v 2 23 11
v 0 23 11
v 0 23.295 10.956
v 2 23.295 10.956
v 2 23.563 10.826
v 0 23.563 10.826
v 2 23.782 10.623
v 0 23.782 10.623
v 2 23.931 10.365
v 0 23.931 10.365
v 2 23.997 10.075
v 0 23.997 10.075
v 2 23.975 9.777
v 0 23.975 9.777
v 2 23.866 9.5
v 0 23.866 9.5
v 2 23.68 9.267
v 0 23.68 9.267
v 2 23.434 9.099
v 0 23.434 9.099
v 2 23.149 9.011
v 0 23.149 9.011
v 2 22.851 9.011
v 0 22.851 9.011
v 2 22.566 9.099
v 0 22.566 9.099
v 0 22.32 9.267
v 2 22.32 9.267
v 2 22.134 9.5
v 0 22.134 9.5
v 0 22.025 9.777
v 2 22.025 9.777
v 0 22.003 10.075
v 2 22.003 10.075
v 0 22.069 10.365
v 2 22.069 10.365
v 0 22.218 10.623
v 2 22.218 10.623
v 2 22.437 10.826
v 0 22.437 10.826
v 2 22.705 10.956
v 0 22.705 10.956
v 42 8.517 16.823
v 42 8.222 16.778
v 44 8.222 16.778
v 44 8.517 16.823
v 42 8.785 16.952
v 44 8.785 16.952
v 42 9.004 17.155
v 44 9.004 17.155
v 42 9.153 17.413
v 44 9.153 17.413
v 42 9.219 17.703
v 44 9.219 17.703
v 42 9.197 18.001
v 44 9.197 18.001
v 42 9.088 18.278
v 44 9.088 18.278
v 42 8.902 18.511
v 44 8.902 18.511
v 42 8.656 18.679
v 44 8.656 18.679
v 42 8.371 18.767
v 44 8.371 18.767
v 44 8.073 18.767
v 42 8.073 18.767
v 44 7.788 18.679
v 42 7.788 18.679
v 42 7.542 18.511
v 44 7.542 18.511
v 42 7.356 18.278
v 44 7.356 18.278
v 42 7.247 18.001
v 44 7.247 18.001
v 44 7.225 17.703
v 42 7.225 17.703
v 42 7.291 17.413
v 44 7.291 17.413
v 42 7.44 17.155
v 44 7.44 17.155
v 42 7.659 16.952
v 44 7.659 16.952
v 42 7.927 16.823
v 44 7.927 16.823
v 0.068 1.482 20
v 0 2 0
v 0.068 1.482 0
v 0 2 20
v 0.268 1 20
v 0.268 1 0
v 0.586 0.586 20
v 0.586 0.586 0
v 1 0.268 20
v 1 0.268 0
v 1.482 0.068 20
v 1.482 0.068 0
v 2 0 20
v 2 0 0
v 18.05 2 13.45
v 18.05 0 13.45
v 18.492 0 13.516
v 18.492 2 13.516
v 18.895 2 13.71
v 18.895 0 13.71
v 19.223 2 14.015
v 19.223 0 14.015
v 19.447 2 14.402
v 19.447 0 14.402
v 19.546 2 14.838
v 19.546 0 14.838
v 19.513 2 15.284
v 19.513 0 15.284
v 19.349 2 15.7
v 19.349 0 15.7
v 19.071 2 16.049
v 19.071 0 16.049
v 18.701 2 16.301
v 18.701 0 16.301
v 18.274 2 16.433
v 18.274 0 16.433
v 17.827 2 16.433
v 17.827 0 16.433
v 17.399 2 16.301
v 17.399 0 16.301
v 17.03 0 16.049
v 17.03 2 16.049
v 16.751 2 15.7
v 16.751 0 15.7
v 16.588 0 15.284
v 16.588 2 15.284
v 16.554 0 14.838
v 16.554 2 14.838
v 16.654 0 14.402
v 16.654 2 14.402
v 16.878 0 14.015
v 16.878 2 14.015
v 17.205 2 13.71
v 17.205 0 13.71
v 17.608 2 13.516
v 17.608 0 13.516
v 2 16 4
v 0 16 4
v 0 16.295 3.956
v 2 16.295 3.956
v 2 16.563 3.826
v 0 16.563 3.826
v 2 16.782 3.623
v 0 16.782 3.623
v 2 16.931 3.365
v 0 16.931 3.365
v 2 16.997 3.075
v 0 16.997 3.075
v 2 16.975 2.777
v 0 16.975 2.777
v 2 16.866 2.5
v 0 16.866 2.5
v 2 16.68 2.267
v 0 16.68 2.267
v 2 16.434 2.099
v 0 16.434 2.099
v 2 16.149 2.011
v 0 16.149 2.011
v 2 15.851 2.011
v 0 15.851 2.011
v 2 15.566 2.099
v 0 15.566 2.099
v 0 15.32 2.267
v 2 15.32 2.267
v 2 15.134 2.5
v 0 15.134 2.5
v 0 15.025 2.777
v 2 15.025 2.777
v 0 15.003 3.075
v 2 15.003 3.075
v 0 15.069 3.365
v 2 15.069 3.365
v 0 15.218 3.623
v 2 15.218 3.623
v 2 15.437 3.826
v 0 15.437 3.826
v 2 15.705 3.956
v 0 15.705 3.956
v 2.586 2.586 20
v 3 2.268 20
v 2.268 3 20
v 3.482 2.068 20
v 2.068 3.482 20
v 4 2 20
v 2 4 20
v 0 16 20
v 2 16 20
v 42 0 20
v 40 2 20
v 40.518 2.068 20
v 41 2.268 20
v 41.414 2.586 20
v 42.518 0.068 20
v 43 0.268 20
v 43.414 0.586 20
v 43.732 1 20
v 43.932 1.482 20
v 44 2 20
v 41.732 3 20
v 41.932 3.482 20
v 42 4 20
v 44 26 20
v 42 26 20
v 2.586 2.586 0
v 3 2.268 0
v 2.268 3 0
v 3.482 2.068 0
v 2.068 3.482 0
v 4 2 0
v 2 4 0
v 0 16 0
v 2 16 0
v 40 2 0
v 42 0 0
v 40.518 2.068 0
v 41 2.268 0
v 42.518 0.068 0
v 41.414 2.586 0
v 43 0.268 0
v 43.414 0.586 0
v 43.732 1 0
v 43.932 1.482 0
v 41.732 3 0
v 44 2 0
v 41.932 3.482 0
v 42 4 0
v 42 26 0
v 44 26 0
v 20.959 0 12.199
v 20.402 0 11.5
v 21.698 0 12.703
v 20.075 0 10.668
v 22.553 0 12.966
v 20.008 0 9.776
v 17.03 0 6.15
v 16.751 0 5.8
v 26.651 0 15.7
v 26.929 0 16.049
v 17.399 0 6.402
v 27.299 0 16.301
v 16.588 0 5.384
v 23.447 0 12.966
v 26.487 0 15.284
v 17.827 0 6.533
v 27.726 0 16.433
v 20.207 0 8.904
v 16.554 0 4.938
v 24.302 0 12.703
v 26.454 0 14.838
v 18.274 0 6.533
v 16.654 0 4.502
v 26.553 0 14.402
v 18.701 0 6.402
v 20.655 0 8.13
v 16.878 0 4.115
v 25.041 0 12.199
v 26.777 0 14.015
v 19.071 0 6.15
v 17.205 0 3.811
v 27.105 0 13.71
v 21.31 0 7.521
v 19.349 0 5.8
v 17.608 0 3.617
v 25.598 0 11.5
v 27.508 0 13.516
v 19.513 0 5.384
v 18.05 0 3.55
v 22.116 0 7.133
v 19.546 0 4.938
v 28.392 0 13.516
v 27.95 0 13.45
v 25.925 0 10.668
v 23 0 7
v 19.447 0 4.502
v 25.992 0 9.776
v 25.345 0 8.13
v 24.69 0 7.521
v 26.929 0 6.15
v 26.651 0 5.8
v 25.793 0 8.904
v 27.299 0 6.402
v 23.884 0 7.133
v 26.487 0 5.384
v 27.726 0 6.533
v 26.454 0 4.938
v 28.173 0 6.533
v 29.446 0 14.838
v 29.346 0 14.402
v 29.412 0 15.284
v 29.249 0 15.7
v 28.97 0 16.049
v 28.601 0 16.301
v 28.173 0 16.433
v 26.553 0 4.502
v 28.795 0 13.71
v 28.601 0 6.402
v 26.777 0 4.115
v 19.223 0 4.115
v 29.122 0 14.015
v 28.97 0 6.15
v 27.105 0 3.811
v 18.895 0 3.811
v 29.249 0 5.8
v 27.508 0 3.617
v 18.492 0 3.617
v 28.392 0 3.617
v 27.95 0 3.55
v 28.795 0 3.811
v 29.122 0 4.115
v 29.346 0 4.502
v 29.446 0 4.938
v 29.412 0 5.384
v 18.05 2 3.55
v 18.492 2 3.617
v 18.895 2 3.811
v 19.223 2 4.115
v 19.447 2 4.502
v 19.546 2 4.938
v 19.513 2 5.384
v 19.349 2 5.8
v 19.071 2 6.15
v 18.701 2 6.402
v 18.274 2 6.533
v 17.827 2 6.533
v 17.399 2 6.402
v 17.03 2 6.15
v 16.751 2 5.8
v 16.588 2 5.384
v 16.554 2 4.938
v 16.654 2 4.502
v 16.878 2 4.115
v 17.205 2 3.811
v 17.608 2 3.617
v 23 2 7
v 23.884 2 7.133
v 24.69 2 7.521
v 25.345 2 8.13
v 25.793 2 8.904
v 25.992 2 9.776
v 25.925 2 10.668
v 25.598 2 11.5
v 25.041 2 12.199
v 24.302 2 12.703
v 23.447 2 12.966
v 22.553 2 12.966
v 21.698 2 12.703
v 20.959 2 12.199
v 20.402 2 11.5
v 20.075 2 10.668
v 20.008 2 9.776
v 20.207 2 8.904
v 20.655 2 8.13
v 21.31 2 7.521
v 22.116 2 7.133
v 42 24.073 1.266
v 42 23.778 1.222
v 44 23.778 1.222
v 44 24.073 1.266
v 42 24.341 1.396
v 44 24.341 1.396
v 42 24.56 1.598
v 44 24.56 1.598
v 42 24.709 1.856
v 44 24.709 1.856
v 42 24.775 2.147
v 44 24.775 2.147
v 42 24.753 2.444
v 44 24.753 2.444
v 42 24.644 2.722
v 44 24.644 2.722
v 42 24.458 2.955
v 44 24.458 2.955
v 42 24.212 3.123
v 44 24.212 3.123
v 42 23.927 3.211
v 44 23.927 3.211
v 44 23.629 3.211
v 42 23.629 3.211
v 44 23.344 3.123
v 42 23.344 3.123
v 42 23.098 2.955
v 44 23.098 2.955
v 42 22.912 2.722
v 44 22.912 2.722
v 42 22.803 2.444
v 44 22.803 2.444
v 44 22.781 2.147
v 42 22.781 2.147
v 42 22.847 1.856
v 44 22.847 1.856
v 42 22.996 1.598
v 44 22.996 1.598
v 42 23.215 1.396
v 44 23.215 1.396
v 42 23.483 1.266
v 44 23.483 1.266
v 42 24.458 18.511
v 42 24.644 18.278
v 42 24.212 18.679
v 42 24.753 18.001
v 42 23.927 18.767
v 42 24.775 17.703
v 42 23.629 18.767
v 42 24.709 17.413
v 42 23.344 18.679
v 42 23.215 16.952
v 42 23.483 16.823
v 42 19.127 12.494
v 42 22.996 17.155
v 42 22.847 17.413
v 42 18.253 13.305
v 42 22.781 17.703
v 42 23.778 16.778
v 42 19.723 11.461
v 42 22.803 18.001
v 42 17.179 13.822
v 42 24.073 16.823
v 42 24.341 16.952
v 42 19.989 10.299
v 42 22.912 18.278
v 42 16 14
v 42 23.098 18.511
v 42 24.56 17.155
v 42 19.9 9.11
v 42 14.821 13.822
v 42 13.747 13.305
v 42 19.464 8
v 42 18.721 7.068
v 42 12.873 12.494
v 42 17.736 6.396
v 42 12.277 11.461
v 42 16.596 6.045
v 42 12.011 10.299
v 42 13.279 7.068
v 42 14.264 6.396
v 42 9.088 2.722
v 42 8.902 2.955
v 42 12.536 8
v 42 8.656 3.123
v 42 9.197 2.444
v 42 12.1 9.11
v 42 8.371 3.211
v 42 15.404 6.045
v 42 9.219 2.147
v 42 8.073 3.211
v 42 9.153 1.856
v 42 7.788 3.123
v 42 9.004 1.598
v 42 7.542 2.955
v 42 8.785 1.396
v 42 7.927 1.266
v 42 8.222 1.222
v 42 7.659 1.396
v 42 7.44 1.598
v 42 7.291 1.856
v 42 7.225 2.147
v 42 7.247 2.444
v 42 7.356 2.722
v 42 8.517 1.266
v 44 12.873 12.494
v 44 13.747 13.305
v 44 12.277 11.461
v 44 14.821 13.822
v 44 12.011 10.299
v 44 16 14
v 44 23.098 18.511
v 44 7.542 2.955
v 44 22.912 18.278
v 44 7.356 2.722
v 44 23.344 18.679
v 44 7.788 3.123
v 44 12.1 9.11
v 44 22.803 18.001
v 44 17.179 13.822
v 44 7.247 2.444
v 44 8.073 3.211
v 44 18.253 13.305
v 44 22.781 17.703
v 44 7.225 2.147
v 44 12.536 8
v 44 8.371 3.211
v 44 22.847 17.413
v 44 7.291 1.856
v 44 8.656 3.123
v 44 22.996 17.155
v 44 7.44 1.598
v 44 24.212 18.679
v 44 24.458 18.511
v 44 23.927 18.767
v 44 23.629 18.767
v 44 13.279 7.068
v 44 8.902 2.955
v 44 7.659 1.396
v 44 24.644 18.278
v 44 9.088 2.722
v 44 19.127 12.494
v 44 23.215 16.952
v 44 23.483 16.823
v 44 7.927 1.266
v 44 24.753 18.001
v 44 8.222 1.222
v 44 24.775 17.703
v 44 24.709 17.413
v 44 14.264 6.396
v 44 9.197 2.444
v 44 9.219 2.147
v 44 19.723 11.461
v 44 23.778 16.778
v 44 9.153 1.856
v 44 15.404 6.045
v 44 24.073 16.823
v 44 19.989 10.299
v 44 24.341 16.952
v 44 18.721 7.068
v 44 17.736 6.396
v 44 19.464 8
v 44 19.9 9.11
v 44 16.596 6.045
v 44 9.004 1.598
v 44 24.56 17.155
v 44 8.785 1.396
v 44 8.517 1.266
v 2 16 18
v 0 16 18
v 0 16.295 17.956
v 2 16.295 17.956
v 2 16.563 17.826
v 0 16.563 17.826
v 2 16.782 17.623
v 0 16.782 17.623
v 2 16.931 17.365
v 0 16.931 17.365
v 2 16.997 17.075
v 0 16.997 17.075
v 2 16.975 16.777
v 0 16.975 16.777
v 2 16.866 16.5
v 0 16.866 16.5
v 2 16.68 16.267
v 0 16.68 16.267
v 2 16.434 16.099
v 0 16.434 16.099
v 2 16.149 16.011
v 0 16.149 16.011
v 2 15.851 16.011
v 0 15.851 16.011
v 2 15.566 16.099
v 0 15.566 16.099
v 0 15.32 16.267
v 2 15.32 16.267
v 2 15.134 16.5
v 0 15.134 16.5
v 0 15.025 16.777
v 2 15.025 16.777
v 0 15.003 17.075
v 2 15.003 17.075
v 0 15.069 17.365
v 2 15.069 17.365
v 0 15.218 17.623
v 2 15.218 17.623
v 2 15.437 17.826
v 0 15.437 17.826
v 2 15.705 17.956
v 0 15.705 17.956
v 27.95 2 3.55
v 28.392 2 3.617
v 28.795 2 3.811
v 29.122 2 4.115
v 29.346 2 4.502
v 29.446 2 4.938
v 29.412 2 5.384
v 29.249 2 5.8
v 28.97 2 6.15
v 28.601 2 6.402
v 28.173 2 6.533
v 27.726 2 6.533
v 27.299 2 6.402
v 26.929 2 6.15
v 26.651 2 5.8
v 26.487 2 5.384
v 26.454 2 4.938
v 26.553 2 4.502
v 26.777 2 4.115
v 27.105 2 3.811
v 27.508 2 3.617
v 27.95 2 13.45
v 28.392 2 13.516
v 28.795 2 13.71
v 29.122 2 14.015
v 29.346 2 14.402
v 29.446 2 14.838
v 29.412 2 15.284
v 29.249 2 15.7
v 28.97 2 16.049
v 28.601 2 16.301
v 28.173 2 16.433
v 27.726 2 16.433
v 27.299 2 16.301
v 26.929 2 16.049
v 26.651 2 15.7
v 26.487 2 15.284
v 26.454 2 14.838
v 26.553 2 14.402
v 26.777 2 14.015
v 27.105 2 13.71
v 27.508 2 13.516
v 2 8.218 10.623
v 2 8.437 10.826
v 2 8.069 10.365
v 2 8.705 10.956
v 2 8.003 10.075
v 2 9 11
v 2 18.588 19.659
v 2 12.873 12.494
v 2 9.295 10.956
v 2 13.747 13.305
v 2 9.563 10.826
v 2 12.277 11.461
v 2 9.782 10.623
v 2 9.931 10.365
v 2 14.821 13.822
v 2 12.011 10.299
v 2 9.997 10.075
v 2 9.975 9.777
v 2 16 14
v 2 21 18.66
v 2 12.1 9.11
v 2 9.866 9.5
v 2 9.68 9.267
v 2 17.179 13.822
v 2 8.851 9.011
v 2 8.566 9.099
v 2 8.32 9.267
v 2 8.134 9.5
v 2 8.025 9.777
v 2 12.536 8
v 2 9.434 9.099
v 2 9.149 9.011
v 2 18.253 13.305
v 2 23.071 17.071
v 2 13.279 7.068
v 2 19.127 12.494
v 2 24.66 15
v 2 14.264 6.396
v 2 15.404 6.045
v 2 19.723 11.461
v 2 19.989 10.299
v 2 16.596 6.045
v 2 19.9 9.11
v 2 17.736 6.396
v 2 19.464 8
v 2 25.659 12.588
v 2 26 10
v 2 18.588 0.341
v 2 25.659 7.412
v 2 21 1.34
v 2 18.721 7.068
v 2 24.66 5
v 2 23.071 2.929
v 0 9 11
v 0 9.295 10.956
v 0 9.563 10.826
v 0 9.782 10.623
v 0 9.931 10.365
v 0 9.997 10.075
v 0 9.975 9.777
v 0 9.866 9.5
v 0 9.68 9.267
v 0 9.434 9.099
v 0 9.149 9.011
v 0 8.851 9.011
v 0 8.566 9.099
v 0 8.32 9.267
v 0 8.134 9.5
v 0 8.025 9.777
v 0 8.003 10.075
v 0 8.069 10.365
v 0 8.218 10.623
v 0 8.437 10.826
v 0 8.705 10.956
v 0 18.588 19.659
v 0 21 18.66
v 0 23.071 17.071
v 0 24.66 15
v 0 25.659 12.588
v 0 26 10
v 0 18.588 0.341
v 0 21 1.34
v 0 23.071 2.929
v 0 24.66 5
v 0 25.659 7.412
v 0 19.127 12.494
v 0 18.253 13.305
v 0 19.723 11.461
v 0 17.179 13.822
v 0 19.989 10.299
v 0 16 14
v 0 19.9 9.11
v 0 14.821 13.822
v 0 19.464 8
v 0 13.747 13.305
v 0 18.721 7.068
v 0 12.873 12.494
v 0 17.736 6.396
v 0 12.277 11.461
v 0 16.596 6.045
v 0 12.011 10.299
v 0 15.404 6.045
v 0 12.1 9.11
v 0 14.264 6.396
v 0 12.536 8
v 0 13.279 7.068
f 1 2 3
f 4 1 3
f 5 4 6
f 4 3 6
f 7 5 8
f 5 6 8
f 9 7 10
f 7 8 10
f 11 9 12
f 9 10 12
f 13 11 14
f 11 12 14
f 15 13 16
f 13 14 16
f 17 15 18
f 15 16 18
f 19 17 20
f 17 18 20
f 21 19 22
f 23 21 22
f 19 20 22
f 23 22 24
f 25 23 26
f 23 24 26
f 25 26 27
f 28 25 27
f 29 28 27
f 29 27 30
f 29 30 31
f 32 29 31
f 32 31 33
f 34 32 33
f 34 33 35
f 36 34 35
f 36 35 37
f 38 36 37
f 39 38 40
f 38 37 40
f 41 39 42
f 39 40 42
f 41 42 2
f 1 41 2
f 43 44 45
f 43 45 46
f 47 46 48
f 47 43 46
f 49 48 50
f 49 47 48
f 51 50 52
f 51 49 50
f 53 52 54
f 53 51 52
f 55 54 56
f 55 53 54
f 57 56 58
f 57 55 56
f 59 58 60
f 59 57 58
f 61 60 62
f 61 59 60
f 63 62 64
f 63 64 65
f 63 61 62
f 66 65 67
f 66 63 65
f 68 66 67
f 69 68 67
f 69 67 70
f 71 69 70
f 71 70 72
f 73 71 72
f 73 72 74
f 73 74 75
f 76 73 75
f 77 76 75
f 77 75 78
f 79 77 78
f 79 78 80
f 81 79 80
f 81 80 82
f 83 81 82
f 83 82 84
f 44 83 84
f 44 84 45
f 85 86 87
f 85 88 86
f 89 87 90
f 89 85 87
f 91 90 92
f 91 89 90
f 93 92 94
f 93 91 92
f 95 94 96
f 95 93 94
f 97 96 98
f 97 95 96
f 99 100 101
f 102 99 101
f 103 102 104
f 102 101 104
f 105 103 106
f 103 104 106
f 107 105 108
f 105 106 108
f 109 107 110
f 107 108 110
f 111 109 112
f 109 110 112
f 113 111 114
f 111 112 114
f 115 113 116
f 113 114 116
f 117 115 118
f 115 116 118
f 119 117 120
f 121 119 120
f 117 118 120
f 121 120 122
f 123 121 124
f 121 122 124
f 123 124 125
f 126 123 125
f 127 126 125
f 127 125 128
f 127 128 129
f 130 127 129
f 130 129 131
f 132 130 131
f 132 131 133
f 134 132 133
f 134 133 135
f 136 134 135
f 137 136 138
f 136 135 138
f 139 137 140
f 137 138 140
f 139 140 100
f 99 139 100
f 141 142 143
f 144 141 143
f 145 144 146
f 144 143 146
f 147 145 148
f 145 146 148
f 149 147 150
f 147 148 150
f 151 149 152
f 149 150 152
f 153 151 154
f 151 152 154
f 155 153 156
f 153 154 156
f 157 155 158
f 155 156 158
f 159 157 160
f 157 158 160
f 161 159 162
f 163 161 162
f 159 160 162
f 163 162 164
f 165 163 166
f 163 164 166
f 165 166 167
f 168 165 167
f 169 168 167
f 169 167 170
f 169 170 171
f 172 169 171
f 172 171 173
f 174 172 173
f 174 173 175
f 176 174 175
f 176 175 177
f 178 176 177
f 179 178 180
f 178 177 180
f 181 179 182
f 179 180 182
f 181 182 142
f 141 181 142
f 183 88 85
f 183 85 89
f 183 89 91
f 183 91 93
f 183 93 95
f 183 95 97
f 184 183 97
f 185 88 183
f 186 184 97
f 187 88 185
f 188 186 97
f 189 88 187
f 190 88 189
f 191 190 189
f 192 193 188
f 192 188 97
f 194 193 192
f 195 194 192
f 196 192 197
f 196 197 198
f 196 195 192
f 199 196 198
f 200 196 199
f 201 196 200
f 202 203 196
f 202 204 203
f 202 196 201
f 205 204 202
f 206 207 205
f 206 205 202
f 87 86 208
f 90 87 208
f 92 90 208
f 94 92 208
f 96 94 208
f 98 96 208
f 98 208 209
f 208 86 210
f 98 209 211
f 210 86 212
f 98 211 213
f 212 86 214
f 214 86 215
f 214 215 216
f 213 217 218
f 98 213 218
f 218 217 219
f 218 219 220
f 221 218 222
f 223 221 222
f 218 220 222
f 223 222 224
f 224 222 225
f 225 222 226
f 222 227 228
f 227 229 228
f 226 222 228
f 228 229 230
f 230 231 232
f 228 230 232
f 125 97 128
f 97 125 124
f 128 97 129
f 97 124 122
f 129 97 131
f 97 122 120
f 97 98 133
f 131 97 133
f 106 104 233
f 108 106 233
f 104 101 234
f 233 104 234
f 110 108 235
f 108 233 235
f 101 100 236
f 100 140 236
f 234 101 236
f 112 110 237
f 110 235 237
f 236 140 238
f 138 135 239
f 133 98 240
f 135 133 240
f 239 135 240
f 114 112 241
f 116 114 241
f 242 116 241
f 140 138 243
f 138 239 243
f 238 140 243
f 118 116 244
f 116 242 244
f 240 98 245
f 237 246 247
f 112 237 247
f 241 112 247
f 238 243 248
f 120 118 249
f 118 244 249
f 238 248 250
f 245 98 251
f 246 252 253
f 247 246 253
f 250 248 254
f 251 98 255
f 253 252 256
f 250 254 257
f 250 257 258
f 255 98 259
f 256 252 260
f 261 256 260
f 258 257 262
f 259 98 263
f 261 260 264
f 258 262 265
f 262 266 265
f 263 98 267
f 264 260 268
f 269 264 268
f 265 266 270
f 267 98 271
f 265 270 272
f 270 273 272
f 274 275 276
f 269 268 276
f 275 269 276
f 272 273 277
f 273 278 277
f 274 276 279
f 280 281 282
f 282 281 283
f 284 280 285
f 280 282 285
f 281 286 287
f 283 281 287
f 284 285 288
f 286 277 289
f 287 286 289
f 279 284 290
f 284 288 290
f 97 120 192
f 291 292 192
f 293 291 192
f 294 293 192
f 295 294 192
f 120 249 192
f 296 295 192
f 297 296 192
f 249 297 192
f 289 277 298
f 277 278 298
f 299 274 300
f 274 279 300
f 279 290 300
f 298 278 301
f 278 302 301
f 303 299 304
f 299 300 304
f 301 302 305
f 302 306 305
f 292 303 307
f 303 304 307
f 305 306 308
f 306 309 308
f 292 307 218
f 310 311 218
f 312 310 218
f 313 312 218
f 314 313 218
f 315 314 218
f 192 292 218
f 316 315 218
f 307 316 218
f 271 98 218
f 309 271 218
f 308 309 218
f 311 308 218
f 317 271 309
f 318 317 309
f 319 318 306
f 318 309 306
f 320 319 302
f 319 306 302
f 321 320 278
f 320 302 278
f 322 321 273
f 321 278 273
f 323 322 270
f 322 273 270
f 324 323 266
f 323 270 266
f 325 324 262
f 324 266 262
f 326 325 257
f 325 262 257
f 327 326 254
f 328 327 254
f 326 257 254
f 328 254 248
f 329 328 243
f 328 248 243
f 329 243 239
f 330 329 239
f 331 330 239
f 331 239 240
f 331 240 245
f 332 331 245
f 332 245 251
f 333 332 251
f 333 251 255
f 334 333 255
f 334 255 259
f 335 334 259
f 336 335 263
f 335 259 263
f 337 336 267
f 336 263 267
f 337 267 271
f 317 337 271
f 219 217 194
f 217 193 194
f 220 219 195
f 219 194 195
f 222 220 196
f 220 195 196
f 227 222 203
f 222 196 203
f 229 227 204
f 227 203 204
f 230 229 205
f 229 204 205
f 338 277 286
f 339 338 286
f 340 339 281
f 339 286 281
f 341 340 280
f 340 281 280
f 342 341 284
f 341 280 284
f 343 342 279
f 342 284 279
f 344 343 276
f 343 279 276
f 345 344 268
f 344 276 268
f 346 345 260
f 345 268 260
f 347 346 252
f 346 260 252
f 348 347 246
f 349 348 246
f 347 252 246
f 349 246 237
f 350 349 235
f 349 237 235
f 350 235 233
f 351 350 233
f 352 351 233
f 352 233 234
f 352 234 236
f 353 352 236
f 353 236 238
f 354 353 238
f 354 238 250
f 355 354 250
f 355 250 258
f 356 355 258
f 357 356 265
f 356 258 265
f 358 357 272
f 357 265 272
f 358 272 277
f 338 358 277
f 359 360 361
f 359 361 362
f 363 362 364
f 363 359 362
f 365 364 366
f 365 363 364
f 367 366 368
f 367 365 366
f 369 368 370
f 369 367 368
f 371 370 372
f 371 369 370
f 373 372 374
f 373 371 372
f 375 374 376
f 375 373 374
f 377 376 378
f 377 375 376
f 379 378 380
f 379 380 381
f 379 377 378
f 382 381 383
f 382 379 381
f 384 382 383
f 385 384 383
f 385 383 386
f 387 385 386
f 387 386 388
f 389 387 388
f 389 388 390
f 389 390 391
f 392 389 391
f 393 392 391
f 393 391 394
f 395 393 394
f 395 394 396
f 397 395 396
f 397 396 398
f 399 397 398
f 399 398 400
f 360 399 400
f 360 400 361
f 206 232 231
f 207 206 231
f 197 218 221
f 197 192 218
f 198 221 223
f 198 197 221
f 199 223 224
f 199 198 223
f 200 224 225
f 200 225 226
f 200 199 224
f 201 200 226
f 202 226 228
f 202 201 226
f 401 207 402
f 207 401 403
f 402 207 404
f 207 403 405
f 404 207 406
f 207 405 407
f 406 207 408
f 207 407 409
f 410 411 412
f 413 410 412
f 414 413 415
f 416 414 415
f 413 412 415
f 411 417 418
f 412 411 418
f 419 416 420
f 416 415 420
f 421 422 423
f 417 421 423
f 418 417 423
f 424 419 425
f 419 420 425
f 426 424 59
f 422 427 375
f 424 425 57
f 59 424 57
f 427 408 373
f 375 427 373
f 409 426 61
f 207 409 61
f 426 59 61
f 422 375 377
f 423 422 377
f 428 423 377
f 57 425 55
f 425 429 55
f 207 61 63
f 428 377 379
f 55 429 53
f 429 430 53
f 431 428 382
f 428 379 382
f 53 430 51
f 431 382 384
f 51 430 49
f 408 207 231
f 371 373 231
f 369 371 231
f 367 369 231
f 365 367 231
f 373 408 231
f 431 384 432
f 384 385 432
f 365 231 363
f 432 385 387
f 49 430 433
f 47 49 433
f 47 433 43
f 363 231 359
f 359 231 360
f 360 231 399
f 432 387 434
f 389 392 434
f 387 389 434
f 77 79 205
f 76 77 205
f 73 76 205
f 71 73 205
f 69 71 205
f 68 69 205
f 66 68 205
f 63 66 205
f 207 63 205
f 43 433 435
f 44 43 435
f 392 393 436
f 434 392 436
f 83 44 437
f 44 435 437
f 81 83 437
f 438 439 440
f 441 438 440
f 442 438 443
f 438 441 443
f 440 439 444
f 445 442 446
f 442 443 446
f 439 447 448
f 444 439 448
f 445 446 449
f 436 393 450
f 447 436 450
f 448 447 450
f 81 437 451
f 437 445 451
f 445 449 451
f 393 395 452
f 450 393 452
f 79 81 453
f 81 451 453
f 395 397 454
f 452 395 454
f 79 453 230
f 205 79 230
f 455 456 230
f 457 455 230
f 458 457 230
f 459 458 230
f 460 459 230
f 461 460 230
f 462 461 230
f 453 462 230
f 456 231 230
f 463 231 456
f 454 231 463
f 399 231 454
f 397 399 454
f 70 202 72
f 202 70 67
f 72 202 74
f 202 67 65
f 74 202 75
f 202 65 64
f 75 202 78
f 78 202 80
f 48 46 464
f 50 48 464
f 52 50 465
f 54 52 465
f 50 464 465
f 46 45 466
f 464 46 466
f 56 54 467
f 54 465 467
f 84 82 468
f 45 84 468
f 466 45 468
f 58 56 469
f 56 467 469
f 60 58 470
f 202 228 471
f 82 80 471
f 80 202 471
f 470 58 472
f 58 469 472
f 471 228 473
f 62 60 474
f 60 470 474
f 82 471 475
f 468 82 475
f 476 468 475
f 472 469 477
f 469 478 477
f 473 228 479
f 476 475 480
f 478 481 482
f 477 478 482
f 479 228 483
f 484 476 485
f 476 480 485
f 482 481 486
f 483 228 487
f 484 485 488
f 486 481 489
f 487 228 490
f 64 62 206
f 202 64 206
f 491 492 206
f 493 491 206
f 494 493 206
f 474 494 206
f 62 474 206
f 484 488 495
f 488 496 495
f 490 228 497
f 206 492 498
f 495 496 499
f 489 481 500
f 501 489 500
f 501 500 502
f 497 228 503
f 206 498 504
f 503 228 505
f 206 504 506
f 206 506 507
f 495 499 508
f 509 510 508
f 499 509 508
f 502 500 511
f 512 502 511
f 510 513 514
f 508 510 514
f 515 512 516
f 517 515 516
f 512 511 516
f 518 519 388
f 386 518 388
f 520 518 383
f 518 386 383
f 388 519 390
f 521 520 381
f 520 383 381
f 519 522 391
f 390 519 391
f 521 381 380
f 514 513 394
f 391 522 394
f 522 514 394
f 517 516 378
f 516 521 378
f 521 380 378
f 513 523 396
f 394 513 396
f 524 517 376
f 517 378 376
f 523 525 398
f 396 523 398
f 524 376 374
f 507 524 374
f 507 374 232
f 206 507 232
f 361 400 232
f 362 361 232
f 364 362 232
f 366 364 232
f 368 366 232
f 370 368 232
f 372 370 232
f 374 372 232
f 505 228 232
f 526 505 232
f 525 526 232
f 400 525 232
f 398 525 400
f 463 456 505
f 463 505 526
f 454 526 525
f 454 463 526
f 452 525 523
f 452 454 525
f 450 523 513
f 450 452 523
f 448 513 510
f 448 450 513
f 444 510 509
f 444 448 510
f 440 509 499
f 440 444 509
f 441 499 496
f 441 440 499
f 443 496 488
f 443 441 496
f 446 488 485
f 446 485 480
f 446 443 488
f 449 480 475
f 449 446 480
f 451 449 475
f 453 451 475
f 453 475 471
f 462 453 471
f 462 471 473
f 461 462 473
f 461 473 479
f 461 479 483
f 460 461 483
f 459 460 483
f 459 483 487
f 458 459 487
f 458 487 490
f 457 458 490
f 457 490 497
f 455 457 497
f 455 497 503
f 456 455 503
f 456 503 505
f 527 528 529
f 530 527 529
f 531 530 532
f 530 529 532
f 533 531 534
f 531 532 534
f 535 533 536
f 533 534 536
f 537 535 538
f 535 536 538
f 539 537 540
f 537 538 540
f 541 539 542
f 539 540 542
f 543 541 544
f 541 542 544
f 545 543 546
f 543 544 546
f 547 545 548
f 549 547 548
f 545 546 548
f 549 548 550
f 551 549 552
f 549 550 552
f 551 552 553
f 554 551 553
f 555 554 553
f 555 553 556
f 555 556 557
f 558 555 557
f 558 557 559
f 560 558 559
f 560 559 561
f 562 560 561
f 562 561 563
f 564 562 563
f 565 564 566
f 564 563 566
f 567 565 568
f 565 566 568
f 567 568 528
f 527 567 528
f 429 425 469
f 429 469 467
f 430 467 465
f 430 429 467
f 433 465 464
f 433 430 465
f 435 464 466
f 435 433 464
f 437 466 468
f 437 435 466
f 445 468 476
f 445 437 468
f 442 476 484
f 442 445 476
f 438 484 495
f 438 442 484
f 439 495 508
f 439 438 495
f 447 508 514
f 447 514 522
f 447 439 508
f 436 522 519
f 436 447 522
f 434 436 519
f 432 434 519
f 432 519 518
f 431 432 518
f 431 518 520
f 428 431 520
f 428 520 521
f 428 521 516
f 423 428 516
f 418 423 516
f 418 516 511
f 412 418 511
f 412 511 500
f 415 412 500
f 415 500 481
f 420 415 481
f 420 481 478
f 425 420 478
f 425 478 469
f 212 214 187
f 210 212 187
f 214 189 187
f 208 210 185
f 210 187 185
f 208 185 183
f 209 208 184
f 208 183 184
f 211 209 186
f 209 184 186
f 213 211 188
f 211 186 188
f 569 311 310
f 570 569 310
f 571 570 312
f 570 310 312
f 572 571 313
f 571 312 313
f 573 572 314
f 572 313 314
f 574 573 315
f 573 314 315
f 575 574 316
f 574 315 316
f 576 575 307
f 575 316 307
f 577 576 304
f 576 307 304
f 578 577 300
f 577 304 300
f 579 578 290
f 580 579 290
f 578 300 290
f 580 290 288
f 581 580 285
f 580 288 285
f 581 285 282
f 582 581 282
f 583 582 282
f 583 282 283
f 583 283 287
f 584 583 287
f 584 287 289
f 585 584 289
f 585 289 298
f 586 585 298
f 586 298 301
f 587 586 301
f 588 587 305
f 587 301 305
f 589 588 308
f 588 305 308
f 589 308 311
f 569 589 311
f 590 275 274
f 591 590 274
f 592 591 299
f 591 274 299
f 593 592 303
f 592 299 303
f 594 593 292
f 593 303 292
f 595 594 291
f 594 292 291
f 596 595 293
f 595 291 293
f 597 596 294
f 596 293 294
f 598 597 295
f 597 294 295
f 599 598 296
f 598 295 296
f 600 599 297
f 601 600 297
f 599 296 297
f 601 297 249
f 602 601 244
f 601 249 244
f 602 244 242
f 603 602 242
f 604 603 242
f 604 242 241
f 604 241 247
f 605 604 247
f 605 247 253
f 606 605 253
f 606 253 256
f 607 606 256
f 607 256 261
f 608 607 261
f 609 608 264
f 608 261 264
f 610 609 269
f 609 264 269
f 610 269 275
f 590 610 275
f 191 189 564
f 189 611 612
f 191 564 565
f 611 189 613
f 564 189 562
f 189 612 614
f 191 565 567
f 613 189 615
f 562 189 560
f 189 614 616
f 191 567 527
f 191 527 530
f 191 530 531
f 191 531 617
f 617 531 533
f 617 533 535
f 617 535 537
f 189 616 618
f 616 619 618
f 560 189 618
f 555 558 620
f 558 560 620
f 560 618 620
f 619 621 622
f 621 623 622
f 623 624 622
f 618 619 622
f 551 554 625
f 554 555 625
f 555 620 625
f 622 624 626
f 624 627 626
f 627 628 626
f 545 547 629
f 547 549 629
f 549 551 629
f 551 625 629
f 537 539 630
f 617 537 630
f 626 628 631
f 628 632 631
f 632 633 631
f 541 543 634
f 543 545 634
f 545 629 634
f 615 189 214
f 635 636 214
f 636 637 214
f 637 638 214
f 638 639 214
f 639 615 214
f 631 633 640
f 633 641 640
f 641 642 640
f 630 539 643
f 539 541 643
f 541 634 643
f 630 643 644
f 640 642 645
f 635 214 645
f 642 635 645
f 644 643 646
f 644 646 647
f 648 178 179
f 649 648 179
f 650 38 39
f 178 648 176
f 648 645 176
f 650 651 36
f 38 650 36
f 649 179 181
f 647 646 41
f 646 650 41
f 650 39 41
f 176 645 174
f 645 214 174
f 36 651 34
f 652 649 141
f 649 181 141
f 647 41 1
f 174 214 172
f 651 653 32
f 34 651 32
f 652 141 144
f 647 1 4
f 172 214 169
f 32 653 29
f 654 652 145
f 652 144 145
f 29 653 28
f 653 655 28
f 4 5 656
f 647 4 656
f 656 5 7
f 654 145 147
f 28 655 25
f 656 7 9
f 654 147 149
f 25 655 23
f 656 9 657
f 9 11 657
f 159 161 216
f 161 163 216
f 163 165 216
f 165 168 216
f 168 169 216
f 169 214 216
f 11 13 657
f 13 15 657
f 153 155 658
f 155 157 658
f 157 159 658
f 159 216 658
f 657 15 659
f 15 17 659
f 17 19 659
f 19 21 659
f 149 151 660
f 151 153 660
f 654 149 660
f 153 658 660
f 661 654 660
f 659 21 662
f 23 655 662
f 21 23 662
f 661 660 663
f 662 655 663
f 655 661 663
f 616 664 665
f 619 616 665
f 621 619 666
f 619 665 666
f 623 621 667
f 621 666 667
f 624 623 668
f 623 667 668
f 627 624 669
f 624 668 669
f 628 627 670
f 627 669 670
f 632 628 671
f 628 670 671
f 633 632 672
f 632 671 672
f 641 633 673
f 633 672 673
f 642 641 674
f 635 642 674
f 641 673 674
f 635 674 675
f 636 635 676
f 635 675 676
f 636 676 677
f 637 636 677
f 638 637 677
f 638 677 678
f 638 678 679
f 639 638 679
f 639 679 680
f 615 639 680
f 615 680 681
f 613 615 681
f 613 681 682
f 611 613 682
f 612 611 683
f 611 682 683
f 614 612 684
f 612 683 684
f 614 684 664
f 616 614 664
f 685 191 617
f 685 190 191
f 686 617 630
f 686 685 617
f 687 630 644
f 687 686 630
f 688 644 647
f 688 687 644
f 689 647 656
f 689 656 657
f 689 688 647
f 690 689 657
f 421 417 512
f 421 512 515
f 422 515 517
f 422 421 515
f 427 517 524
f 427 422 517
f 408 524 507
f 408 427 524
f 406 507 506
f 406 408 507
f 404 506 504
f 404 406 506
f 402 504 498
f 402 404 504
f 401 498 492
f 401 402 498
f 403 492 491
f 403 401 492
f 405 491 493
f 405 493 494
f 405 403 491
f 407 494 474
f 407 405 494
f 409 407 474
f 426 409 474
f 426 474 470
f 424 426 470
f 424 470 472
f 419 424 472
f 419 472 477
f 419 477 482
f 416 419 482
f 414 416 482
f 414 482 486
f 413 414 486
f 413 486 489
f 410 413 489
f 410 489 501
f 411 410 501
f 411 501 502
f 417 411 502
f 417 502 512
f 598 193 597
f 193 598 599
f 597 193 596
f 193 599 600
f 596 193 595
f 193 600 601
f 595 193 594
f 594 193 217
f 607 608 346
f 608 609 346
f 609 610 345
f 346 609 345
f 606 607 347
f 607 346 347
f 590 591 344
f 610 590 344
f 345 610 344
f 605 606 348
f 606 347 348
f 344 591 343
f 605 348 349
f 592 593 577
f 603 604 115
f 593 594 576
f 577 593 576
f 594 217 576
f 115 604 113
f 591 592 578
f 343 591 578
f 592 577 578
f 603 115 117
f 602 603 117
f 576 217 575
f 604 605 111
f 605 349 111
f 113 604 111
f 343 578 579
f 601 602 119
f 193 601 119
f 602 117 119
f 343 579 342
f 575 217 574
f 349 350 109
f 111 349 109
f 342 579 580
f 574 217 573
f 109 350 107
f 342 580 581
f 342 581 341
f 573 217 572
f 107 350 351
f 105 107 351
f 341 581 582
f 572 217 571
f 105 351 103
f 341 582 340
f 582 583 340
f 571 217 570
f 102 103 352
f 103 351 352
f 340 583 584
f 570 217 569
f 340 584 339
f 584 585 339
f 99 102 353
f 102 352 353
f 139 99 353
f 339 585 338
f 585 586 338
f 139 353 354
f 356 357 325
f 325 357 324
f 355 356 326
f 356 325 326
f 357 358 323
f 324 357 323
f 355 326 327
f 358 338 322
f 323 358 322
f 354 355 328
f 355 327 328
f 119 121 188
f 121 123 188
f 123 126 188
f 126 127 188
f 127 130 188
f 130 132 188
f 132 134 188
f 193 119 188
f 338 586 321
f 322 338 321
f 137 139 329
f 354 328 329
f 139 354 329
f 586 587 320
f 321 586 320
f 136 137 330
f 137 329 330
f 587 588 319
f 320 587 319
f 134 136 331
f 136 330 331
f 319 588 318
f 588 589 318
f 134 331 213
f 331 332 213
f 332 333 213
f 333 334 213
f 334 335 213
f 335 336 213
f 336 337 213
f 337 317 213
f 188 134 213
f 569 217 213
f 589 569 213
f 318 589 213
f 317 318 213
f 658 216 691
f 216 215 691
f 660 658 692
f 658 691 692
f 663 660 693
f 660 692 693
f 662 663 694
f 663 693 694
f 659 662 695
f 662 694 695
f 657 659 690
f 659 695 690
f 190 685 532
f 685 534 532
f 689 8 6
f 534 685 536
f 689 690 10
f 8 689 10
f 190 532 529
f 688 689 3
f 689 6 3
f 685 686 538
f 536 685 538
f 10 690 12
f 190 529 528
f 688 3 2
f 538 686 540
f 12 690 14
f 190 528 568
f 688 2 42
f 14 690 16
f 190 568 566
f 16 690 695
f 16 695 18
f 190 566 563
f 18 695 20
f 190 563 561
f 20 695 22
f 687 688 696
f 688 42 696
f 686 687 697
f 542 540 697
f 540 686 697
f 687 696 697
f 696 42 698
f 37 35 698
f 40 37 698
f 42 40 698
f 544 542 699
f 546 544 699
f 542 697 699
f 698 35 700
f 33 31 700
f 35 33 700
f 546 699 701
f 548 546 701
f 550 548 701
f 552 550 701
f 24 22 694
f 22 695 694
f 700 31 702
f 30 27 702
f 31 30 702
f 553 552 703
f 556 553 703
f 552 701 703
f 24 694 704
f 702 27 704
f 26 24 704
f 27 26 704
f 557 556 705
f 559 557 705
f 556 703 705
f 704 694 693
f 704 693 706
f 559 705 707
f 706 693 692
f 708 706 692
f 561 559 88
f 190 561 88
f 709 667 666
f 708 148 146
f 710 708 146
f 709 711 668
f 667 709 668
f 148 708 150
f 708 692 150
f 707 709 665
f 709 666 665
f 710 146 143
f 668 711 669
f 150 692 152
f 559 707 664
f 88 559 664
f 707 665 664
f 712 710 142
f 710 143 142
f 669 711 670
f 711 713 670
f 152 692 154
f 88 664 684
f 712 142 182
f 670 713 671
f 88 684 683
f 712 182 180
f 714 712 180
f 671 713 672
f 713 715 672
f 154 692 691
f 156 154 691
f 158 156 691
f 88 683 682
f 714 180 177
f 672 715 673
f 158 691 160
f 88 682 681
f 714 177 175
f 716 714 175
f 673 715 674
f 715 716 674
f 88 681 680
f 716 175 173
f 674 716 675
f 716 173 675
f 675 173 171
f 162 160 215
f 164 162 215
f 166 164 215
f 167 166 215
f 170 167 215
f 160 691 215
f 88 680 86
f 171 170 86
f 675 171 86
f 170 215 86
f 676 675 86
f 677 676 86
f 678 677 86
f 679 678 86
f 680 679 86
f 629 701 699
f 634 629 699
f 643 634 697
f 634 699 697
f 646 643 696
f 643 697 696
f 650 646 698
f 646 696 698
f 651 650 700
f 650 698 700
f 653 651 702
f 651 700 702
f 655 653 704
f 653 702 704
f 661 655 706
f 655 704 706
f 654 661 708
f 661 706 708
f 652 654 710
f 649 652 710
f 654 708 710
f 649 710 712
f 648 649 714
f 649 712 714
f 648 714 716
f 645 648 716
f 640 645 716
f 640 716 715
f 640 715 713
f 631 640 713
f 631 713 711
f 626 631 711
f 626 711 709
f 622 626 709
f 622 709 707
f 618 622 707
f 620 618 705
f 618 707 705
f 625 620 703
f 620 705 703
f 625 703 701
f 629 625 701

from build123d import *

# Parameters (mm, degrees)
EXTRUDE_1051_DEPTH     = 20
SKETCH2_R              = 4
SKETCH2_R_2            = 1
CUT_EXTRUDE_1_DEPTH    = 2
CUT_EXTRUDE_START      = -20
SKETCH3_R              = 1
SKETCH3_R_2            = 4
CUT_EXTRUDE_2_DEPTH    = 20
SKETCH4_R              = 3
SKETCH4_R_2            = 1.5
CUT_EXTRUDE_2789_DEPTH = 2
FILLET1_R              = 10
FILLET2_R              = 2


with BuildPart() as part:
    # Sketch1 → Extrude 1051 (new body)
    with BuildSketch(Plane.XY):
        Polygon((0, 0), (44, 0), (44, 26), (42, 26), (42, 2), (2, 2), (2, 26), (0, 26), align=None)
    extrude(amount=EXTRUDE_1051_DEPTH)

    # Sketch2 → Отверстия под ось и винты 1 (cut)
    with BuildSketch(Plane.ZY):
        with Locations((10, 16)):
            Circle(SKETCH2_R)
        with Locations((10, 23)):
            Circle(SKETCH2_R_2)
        with Locations((17, 16)):
            Circle(SKETCH2_R_2)
        with Locations((10, 9)):
            Circle(SKETCH2_R_2)
        with Locations((3, 16)):
            Circle(SKETCH2_R_2)
    extrude(amount=-CUT_EXTRUDE_1_DEPTH, mode=Mode.SUBTRACT)

    # Sketch3 → Отверстия под ось и винты 2 (cut)
    with BuildSketch(Plane(origin=(44, 0, 0), x_dir=(0, 0, -1), z_dir=(1, 0, 0)).offset(CUT_EXTRUDE_START)):
        with Locations((-17.778174593, 23.778174593)):
            Circle(SKETCH3_R)
        with Locations(Location((-10, 16, 0), (0, 0, 180))):
            Circle(SKETCH3_R_2)
        with Locations((-2.221825407, 23.778174593)):
            Circle(SKETCH3_R)
        with Locations((-2.221825407, 8.221825407)):
            Circle(SKETCH3_R)
        with Locations((-17.778174593, 8.221825407)):
            Circle(SKETCH3_R)
    extrude(amount=CUT_EXTRUDE_2_DEPTH, mode=Mode.SUBTRACT)

    # Sketch4 → Cut-Extrude 2789 (cut)
    with BuildSketch(Plane.XZ):
        with Locations(Location((23, 10, 0), (0, 0, 270))):
            Circle(SKETCH4_R)
        with Locations(Location((18.050252532, 5.050252532, 0), (0, 0, 270))):
            Circle(SKETCH4_R_2)
        with Locations(Location((27.949747468, 5.050252532, 0), (0, 0, 270))):
            Circle(SKETCH4_R_2)
        with Locations(Location((18.050252532, 14.949747468, 0), (0, 0, 270))):
            Circle(SKETCH4_R_2)
        with Locations(Location((27.949747468, 14.949747468, 0), (0, 0, 270))):
            Circle(SKETCH4_R_2)
    extrude(amount=-CUT_EXTRUDE_2789_DEPTH, mode=Mode.SUBTRACT)

    # Fillet1
    fillet1_edges = [part.edges().sort_by_distance(p)[0] for p in [
        (1, 26, 0),
        (1, 26, 20),
    ]]
    fillet(fillet1_edges, radius=FILLET1_R - 0.0001)  # a hair under: the kernel refuses the full size

    # Fillet2
    fillet2_edges = [part.edges().sort_by_distance(p)[0] for p in [
        (44, 0, 10),
        (0, 0, 10),
        (2, 2, 10),
        (42, 2, 10),
    ]]
    fillet(fillet2_edges, radius=FILLET2_R)


solid = part.part
